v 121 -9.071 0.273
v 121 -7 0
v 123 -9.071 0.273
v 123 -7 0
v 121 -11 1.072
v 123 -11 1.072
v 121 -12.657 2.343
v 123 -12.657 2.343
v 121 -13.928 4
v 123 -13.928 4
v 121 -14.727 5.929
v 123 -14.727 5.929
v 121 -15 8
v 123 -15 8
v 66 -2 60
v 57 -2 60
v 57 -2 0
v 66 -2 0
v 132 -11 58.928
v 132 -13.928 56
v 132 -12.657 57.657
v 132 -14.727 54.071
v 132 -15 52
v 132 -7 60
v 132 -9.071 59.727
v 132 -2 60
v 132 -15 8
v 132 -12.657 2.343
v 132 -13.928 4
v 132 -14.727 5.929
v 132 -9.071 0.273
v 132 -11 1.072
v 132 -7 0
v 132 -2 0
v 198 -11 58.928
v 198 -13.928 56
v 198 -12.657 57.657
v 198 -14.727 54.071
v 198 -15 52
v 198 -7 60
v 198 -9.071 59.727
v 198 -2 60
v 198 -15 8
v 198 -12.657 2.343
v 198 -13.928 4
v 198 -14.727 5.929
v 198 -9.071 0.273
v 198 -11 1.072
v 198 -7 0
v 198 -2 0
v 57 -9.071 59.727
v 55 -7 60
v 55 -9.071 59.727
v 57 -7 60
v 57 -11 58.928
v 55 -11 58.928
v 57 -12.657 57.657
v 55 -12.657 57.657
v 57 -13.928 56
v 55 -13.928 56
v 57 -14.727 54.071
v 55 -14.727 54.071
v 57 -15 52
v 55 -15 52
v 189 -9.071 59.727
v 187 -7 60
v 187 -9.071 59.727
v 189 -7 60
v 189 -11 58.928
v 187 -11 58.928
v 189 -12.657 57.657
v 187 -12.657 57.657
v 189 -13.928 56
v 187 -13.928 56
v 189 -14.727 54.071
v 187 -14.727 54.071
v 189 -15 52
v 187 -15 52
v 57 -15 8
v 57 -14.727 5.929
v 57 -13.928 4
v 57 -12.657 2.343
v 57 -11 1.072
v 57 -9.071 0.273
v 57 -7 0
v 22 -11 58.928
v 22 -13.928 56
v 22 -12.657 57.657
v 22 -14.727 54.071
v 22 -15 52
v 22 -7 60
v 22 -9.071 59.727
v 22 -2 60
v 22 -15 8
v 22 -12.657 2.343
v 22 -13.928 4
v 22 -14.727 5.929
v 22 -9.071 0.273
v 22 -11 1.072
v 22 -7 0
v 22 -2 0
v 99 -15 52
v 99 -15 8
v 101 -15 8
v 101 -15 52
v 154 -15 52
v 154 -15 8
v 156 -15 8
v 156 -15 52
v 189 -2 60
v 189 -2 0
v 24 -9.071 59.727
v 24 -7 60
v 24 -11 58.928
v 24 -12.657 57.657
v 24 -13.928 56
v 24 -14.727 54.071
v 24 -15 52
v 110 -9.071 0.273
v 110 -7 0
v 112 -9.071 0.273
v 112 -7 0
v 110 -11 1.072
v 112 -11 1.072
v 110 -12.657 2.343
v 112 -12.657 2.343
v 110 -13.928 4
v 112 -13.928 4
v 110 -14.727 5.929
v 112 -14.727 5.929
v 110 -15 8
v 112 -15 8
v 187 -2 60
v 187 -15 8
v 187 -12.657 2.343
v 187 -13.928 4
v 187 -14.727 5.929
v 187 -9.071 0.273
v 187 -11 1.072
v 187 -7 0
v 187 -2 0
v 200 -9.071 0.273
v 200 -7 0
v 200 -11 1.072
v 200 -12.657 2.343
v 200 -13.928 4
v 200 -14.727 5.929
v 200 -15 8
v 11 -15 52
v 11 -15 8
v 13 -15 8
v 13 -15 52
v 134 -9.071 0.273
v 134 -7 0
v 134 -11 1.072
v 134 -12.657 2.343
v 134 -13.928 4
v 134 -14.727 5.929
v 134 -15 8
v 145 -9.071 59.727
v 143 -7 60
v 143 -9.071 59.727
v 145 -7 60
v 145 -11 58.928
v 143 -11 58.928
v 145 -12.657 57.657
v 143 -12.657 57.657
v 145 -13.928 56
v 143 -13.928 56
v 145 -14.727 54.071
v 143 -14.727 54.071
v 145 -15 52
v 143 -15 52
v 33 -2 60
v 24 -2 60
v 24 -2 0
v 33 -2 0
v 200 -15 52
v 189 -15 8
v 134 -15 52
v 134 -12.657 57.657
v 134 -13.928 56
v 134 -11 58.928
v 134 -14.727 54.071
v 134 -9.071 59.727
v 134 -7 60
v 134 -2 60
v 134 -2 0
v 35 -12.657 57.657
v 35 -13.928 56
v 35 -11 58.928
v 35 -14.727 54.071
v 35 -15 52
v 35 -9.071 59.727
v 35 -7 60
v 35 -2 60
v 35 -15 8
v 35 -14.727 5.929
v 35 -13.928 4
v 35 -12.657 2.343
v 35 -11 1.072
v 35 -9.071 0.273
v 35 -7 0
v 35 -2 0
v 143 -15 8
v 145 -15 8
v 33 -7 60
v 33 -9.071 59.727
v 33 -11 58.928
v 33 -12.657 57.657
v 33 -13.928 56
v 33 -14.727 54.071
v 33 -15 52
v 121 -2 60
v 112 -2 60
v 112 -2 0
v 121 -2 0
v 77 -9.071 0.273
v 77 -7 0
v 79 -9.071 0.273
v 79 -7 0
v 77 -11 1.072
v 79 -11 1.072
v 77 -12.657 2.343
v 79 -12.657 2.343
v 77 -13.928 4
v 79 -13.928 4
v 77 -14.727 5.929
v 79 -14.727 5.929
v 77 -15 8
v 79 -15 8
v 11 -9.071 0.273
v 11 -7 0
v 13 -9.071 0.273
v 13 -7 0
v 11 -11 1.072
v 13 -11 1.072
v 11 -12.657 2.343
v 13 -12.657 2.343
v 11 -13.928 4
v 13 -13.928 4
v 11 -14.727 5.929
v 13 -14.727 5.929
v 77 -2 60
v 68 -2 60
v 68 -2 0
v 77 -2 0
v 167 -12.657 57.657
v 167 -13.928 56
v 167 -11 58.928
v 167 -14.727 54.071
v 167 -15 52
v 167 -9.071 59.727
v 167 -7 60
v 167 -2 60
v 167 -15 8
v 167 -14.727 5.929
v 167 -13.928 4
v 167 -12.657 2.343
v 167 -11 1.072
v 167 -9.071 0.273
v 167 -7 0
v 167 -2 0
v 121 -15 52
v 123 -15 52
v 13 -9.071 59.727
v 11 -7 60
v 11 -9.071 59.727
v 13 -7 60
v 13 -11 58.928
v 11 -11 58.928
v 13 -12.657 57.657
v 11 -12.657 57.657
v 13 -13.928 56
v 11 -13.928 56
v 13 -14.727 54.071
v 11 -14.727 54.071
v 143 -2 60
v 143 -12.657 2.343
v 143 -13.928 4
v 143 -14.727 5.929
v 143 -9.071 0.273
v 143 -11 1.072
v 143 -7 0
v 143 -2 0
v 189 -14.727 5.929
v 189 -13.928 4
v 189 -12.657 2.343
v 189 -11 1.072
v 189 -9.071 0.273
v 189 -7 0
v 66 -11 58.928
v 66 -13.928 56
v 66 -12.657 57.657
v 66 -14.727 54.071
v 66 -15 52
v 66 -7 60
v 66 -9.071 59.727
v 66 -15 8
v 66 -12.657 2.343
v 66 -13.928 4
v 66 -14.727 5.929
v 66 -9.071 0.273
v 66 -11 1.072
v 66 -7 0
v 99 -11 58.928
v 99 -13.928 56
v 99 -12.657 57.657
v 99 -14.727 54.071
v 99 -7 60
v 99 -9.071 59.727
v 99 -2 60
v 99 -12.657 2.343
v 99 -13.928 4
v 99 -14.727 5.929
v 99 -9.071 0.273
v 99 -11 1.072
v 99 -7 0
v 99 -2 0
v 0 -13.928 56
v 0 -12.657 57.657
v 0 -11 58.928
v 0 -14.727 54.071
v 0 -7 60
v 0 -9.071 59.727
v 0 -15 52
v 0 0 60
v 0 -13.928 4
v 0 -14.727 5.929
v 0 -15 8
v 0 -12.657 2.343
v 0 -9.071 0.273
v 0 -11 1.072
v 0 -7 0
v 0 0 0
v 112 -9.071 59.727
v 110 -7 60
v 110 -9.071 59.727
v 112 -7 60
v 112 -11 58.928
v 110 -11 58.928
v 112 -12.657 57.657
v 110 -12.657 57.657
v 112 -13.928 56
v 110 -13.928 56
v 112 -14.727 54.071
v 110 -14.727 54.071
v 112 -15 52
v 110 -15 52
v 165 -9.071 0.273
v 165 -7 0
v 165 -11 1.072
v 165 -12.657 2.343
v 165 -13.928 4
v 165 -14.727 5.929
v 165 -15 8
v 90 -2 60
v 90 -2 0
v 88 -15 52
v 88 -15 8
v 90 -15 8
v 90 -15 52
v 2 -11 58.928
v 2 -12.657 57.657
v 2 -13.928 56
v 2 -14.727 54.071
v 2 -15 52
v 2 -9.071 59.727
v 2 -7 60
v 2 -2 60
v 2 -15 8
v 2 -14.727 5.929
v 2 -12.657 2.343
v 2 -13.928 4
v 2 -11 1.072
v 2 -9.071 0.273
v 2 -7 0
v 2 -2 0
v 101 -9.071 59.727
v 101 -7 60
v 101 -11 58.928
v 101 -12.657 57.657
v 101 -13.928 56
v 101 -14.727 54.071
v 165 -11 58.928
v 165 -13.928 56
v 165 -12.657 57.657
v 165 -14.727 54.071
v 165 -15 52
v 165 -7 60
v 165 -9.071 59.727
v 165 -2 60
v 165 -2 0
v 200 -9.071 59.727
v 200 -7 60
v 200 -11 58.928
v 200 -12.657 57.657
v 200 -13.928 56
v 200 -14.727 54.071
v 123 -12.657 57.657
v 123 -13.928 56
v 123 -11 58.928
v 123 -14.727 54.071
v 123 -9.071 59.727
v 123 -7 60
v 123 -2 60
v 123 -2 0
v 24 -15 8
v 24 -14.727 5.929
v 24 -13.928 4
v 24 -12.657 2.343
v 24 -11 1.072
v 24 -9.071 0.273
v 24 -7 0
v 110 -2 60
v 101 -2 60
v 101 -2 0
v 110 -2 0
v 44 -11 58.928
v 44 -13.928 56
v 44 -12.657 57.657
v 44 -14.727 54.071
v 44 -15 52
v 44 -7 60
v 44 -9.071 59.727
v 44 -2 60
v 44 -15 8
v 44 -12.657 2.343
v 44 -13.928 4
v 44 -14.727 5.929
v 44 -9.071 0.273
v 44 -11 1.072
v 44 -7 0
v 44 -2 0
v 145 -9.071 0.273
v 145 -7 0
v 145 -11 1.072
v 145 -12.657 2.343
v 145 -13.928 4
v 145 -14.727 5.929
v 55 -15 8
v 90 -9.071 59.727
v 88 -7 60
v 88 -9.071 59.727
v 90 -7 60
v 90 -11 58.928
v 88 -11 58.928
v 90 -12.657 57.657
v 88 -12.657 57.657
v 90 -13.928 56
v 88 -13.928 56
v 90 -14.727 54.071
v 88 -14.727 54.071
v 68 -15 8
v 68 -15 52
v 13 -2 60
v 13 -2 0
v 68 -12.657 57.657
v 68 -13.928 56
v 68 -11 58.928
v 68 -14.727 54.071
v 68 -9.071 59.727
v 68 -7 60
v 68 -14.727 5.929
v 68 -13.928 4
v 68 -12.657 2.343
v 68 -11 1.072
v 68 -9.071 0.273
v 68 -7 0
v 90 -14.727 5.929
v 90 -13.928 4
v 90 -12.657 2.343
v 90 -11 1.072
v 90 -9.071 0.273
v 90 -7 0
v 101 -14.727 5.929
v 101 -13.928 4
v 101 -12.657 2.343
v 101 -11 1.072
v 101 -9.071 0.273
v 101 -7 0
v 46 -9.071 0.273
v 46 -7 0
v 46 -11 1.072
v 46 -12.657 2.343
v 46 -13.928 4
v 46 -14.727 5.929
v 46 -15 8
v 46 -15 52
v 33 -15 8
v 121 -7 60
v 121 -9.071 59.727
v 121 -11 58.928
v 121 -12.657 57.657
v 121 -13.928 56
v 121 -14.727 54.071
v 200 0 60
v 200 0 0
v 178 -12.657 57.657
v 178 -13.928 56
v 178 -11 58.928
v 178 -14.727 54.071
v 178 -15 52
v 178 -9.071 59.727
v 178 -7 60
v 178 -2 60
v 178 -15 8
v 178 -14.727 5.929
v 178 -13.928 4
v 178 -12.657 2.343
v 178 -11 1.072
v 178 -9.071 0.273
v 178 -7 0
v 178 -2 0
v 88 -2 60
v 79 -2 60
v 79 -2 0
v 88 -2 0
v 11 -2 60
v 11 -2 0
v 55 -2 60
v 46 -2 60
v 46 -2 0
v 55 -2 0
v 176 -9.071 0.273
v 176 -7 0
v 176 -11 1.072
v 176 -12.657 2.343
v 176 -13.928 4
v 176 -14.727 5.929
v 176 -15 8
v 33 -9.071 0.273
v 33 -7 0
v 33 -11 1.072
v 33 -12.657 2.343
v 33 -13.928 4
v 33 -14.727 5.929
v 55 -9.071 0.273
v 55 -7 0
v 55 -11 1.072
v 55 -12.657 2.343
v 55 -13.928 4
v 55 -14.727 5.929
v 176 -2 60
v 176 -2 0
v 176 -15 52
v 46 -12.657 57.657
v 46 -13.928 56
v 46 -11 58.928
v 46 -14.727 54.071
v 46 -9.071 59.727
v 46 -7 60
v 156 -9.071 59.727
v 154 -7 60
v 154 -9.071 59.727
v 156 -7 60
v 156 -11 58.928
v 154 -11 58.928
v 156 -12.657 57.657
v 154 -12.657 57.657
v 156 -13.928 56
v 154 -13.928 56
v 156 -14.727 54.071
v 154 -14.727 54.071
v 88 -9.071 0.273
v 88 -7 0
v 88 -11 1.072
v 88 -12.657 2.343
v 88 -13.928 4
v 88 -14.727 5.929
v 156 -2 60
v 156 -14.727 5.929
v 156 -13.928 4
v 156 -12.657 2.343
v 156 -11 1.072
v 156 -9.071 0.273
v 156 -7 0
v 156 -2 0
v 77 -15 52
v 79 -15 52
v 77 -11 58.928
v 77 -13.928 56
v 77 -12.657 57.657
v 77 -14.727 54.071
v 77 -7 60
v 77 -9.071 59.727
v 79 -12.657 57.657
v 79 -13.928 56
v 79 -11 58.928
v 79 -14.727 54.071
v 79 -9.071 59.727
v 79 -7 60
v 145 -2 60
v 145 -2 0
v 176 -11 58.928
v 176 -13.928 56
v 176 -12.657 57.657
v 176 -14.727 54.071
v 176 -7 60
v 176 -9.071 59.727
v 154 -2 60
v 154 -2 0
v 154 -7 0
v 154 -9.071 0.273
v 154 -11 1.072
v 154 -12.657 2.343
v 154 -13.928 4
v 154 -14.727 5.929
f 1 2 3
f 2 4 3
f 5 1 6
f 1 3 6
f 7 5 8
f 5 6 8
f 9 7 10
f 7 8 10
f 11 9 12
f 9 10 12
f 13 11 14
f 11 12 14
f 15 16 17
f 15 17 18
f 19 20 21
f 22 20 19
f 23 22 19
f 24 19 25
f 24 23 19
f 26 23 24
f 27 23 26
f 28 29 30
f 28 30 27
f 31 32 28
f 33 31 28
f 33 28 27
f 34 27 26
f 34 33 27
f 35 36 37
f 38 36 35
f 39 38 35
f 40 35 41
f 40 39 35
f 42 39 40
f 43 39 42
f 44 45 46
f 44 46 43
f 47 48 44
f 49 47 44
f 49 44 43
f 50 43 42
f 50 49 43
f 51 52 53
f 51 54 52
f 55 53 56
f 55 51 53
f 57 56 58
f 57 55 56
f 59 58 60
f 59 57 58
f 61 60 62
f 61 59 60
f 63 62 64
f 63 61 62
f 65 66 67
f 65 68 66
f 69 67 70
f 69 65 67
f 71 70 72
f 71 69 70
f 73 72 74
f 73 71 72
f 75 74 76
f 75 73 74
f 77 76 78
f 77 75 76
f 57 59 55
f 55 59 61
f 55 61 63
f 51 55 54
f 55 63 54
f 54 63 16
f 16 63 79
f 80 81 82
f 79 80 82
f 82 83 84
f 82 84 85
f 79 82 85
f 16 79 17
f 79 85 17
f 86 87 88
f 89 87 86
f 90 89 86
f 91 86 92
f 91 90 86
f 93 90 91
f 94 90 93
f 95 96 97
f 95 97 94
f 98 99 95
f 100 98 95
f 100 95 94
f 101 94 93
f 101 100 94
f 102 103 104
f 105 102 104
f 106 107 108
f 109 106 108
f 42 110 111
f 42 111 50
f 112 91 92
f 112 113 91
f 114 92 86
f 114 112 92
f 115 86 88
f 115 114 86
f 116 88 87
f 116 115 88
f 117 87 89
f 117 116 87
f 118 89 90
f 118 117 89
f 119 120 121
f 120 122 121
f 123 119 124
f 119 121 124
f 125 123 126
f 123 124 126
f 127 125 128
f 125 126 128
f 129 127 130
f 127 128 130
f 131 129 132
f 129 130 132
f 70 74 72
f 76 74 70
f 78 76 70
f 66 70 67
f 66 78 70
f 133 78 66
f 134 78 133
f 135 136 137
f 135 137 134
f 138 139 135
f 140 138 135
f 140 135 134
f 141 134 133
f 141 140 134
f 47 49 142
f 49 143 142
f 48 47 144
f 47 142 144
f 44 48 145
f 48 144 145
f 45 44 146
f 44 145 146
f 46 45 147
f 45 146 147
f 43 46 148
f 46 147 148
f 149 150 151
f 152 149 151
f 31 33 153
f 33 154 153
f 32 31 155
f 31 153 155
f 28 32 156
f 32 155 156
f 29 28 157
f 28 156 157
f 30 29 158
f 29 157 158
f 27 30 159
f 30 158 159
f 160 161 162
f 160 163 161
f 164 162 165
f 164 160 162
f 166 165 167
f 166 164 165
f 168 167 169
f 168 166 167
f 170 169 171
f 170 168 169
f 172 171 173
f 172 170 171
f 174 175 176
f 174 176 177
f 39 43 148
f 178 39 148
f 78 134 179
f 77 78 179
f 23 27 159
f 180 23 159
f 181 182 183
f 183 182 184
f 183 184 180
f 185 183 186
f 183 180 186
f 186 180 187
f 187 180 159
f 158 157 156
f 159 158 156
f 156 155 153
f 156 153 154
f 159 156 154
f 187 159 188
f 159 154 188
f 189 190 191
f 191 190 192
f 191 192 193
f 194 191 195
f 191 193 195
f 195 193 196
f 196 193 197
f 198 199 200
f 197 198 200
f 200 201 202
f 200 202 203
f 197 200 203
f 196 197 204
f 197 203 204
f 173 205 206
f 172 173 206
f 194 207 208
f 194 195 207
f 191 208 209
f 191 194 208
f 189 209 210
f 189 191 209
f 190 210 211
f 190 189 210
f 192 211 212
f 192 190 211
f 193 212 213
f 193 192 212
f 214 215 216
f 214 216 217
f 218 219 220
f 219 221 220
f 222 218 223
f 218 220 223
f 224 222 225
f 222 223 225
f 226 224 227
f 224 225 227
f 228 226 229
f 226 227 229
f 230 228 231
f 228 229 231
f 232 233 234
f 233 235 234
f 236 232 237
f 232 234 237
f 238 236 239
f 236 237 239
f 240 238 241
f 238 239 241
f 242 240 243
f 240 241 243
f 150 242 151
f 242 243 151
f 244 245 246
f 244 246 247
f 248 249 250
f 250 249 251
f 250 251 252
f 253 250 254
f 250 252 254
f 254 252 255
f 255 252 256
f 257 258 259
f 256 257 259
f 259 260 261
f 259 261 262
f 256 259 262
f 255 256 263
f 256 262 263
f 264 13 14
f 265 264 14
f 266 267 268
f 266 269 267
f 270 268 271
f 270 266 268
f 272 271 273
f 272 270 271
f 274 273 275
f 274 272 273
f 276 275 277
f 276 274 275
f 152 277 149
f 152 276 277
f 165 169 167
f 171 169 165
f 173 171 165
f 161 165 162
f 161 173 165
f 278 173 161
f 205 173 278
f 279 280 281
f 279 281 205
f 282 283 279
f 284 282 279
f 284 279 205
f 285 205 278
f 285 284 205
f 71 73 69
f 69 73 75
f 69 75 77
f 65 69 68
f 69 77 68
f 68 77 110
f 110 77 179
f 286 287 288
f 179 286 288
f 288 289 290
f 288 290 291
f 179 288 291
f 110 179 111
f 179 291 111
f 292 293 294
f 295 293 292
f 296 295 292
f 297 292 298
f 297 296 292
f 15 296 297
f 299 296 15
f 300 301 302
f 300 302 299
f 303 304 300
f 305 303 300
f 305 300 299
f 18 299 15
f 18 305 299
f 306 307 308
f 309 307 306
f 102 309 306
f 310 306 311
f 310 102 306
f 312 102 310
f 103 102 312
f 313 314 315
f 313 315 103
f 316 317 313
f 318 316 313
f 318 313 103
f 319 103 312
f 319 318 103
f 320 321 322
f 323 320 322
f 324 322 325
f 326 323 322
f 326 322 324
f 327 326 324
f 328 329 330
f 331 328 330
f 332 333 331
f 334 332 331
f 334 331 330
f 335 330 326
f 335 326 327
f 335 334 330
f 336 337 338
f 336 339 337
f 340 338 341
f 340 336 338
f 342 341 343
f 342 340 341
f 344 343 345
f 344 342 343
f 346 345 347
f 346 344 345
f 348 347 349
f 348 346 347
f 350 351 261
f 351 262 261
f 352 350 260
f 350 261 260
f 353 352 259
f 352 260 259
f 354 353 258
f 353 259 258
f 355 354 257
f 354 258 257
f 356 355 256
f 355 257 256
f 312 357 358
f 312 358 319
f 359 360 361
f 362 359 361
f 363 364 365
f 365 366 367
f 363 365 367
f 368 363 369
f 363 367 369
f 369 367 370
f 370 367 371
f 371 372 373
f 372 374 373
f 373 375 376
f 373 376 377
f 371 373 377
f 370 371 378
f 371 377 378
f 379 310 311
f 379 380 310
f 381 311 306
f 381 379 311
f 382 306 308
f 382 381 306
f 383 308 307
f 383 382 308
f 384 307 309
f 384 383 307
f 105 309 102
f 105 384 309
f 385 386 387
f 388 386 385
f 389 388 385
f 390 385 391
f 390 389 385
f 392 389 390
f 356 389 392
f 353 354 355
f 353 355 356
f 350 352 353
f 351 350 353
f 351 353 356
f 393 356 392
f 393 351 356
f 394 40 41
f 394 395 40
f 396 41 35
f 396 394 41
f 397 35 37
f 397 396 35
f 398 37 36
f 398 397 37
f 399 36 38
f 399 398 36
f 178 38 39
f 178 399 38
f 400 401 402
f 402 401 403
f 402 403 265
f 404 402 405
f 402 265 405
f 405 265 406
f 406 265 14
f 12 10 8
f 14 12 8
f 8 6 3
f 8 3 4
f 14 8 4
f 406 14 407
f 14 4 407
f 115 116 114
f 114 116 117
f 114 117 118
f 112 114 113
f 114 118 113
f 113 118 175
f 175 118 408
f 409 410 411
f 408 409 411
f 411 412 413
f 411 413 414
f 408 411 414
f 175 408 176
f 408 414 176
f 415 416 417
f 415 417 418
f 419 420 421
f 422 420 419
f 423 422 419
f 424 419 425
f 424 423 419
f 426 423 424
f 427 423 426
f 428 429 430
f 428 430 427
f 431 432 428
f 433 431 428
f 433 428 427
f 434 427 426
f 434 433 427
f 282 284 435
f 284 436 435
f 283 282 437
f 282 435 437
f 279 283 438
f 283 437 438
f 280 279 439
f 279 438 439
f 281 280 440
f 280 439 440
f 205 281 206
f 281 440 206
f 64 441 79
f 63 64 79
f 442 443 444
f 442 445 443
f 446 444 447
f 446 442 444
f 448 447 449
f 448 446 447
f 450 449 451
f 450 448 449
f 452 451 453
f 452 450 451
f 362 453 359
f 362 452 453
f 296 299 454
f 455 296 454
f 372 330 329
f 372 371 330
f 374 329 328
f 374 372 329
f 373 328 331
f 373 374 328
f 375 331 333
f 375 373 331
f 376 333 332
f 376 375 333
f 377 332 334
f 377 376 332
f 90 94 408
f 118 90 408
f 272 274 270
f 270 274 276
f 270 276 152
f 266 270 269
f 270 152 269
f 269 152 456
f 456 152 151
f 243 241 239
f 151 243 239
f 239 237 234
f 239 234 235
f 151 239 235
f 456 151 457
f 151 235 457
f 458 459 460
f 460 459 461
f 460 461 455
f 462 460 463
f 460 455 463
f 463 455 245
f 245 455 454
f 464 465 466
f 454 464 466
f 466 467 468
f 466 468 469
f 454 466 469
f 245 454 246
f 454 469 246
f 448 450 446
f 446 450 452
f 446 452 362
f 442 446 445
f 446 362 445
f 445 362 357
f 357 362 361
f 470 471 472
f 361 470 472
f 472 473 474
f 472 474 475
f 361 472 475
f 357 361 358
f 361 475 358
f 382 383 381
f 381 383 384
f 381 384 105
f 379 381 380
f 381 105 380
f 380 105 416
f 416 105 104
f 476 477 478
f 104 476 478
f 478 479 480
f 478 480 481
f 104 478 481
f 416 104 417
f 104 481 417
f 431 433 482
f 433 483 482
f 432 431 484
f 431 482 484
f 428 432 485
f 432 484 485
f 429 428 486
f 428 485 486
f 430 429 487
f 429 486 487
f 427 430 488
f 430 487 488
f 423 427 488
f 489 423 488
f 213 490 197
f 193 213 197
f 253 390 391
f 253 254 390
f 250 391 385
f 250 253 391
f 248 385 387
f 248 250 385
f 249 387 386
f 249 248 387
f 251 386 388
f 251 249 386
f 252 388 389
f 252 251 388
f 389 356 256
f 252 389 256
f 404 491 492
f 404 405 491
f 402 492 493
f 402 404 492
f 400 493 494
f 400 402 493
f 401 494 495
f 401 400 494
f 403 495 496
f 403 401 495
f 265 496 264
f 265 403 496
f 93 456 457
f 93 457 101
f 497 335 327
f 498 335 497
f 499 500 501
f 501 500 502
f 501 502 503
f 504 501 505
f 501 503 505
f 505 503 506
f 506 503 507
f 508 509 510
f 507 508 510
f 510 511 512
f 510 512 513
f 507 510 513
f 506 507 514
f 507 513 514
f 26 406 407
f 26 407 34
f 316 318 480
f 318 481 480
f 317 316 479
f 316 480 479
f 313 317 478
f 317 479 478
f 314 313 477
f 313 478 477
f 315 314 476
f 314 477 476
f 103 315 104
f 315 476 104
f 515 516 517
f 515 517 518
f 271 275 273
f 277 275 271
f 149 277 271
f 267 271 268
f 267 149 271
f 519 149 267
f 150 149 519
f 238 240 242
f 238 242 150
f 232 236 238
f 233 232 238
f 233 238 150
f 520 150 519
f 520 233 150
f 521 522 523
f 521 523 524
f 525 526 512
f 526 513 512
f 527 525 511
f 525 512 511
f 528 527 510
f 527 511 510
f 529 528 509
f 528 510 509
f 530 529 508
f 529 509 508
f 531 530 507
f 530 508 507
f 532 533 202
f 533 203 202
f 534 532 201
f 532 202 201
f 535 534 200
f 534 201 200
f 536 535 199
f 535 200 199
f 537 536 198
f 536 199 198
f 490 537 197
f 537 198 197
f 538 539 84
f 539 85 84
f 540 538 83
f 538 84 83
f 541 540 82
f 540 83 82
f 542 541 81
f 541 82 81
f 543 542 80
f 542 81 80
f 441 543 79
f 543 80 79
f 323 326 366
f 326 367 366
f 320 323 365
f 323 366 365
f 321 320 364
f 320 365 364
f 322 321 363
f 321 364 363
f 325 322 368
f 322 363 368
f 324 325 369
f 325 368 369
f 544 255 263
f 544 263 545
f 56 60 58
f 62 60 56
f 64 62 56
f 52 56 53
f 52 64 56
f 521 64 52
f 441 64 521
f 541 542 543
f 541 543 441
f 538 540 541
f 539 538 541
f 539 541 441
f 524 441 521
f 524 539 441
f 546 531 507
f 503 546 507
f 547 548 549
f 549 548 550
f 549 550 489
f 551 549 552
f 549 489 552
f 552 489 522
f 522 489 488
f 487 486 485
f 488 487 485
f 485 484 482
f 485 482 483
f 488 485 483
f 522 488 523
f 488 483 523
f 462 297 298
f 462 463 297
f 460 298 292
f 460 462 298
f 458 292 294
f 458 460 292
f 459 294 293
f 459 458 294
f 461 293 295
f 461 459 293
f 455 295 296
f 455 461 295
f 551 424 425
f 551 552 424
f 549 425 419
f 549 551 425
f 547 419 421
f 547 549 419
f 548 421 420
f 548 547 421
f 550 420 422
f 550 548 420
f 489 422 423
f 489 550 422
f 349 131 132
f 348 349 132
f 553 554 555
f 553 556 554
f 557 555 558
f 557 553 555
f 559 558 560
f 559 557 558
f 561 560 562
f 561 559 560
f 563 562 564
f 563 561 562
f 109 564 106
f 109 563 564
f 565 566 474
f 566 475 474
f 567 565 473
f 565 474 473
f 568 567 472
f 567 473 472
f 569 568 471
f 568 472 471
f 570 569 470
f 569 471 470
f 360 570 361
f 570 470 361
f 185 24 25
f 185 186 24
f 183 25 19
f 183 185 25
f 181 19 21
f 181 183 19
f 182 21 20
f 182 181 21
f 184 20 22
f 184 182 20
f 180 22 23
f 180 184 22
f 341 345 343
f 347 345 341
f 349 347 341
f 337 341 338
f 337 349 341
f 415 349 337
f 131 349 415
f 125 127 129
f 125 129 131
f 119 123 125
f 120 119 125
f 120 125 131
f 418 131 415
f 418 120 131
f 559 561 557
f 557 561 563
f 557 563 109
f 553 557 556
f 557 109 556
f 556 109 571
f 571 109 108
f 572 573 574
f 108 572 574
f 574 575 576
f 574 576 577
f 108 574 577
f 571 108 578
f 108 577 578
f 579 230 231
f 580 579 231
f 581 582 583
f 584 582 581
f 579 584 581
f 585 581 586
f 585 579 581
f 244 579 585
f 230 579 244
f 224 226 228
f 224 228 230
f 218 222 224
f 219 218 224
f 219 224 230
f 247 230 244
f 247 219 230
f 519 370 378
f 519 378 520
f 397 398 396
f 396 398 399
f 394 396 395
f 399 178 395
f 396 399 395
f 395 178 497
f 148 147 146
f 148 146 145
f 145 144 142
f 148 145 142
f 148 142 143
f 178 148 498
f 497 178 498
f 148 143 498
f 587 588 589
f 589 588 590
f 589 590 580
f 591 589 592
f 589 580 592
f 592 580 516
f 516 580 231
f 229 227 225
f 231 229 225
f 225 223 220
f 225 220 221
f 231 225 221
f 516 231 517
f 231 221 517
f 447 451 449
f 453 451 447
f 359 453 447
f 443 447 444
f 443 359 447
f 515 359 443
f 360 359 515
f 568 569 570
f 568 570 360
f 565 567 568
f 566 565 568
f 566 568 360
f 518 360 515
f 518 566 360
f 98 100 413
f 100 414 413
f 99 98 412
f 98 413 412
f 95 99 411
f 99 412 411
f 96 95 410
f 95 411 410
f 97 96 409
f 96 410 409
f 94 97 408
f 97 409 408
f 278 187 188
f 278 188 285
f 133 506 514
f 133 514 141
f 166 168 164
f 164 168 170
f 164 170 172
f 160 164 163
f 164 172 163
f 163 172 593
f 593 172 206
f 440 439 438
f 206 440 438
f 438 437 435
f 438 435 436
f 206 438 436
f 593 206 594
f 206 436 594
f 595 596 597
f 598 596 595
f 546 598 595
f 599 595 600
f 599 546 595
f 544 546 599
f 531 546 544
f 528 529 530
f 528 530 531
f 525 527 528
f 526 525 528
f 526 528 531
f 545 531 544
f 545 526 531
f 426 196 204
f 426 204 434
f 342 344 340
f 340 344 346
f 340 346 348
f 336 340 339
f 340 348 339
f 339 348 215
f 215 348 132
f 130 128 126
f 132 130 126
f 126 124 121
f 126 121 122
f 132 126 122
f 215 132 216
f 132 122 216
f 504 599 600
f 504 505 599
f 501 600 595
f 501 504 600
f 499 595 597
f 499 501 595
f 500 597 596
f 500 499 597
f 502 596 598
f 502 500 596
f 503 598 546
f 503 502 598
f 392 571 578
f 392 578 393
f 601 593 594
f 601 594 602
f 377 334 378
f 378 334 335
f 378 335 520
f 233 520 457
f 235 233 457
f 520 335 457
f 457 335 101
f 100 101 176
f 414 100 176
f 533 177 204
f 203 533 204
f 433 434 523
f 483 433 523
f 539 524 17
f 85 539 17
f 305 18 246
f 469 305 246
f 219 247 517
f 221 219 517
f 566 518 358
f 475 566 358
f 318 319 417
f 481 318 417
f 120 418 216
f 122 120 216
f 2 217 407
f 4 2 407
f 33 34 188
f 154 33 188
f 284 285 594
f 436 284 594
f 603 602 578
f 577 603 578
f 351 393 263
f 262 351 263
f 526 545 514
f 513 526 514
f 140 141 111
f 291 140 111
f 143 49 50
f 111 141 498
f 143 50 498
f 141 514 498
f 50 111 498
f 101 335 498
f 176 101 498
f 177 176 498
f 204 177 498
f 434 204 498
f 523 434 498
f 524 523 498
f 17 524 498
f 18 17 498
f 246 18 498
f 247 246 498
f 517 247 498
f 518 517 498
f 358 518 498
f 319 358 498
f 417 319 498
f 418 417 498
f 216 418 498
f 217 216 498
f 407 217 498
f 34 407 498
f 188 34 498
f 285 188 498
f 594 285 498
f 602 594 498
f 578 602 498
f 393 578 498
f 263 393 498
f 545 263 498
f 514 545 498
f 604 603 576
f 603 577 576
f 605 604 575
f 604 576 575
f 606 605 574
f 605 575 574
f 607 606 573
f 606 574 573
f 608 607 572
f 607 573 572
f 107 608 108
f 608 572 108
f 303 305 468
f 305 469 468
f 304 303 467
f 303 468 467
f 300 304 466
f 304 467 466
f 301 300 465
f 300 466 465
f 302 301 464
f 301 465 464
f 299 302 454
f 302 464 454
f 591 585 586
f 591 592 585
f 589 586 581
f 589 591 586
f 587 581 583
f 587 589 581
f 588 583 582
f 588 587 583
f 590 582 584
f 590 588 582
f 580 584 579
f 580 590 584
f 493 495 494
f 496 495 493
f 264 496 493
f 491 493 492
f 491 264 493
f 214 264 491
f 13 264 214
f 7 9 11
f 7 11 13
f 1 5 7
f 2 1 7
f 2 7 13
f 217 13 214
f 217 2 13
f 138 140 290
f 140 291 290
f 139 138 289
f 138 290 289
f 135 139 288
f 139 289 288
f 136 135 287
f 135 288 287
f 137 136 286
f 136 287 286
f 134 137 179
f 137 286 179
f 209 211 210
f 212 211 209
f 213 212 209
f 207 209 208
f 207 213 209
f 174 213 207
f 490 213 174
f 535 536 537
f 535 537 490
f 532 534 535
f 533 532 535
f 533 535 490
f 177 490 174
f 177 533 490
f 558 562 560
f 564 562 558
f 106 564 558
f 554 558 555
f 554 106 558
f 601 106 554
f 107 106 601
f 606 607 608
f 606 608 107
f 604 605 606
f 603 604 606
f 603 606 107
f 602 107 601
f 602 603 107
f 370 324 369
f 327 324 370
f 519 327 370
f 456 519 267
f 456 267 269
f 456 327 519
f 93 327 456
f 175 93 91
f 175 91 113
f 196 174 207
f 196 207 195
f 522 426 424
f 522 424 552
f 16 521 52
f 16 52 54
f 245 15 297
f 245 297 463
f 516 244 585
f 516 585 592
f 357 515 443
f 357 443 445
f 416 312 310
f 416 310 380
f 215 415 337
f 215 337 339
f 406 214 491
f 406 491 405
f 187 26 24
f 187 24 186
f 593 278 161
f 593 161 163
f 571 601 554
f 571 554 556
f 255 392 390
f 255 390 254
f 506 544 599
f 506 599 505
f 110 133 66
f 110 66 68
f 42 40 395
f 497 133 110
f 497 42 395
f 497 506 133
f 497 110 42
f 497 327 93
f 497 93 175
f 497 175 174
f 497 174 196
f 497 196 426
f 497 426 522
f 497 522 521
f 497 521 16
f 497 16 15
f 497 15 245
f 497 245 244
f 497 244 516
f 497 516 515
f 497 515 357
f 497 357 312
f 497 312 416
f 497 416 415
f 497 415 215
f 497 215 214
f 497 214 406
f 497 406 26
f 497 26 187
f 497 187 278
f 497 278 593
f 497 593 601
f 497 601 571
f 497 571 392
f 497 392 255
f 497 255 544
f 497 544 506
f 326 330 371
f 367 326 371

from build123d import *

# Parameters (mm, degrees)
BOX016_W     = 9
BOX016_H     = 13
BOX016_DEPTH = 60
BOX004_W     = 9
BOX004_H     = 13
BOX004_DEPTH = 60
BOX005_W     = 9
BOX005_H     = 13
BOX005_DEPTH = 60
BOX006_W     = 9
BOX006_H     = 13
BOX006_DEPTH = 60
BOX007_W     = 9
BOX007_H     = 13
BOX007_DEPTH = 60
BOX008_W     = 9
BOX008_H     = 13
BOX008_DEPTH = 60
BOX009_W     = 9
BOX009_H     = 13
BOX009_DEPTH = 60
BOX010_W     = 9
BOX010_H     = 13
BOX010_DEPTH = 60
BOX011_W     = 9
BOX011_H     = 13
BOX011_DEPTH = 60
BOX012_W     = 9
BOX012_H     = 13
BOX012_DEPTH = 60
BOX013_W     = 9
BOX013_H     = 13
BOX013_DEPTH = 60
BOX014_W     = 9
BOX014_H     = 13
BOX014_DEPTH = 60
BOX015_W     = 9
BOX015_H     = 13
BOX015_DEPTH = 60
BOX017_W     = 9
BOX017_H     = 13
BOX017_DEPTH = 60
BOX018_W     = 9
BOX018_H     = 13
BOX018_DEPTH = 60
BOX019_W     = 9
BOX019_H     = 13
BOX019_DEPTH = 60
BOX020_W     = 9
BOX020_H     = 13
BOX020_DEPTH = 60
BOX003_W     = 9
BOX003_H     = 13
BOX003_DEPTH = 60
BOX002_W     = 200
BOX002_H     = 15
BOX002_DEPTH = 60
FILLET_R     = 8


with BuildPart() as cube016:
    # Box016 → Box016 (new body)
    with BuildSketch(Plane(origin=(145, -15, 0), x_dir=(1, 0, 0), z_dir=(0, 0, 1))):
        with Locations((4.5, 6.5)):
            Rectangle(BOX016_W, BOX016_H)
    extrude(amount=BOX016_DEPTH)


with BuildPart() as cube004:
    # Box004 → Box004 (new body)
    with BuildSketch(Plane(origin=(13, -15, 0), x_dir=(1, 0, 0), z_dir=(0, 0, 1))):
        with Locations((4.5, 6.5)):
            Rectangle(BOX004_W, BOX004_H)
    extrude(amount=BOX004_DEPTH)


with BuildPart() as cube005:
    # Box005 → Box005 (new body)
    with BuildSketch(Plane(origin=(24, -15, 0), x_dir=(1, 0, 0), z_dir=(0, 0, 1))):
        with Locations((4.5, 6.5)):
            Rectangle(BOX005_W, BOX005_H)
    extrude(amount=BOX005_DEPTH)


with BuildPart() as cube006:
    # Box006 → Box006 (new body)
    with BuildSketch(Plane(origin=(35, -15, 0), x_dir=(1, 0, 0), z_dir=(0, 0, 1))):
        with Locations((4.5, 6.5)):
            Rectangle(BOX006_W, BOX006_H)
    extrude(amount=BOX006_DEPTH)


with BuildPart() as cube007:
    # Box007 → Box007 (new body)
    with BuildSketch(Plane(origin=(46, -15, 0), x_dir=(1, 0, 0), z_dir=(0, 0, 1))):
        with Locations((4.5, 6.5)):
            Rectangle(BOX007_W, BOX007_H)
    extrude(amount=BOX007_DEPTH)


with BuildPart() as cube008:
    # Box008 → Box008 (new body)
    with BuildSketch(Plane(origin=(57, -15, 0), x_dir=(1, 0, 0), z_dir=(0, 0, 1))):
        with Locations((4.5, 6.5)):
            Rectangle(BOX008_W, BOX008_H)
    extrude(amount=BOX008_DEPTH)


with BuildPart() as cube009:
    # Box009 → Box009 (new body)
    with BuildSketch(Plane(origin=(68, -15, 0), x_dir=(1, 0, 0), z_dir=(0, 0, 1))):
        with Locations((4.5, 6.5)):
            Rectangle(BOX009_W, BOX009_H)
    extrude(amount=BOX009_DEPTH)


with BuildPart() as cube010:
    # Box010 → Box010 (new body)
    with BuildSketch(Plane(origin=(79, -15, 0), x_dir=(1, 0, 0), z_dir=(0, 0, 1))):
        with Locations((4.5, 6.5)):
            Rectangle(BOX010_W, BOX010_H)
    extrude(amount=BOX010_DEPTH)


with BuildPart() as cube011:
    # Box011 → Box011 (new body)
    with BuildSketch(Plane(origin=(90, -15, 0), x_dir=(1, 0, 0), z_dir=(0, 0, 1))):
        with Locations((4.5, 6.5)):
            Rectangle(BOX011_W, BOX011_H)
    extrude(amount=BOX011_DEPTH)


with BuildPart() as cube012:
    # Box012 → Box012 (new body)
    with BuildSketch(Plane(origin=(101, -15, 0), x_dir=(1, 0, 0), z_dir=(0, 0, 1))):
        with Locations((4.5, 6.5)):
            Rectangle(BOX012_W, BOX012_H)
    extrude(amount=BOX012_DEPTH)


with BuildPart() as cube013:
    # Box013 → Box013 (new body)
    with BuildSketch(Plane(origin=(112, -15, 0), x_dir=(1, 0, 0), z_dir=(0, 0, 1))):
        with Locations((4.5, 6.5)):
            Rectangle(BOX013_W, BOX013_H)
    extrude(amount=BOX013_DEPTH)


with BuildPart() as cube014:
    # Box014 → Box014 (new body)
    with BuildSketch(Plane(origin=(123, -15, 0), x_dir=(1, 0, 0), z_dir=(0, 0, 1))):
        with Locations((4.5, 6.5)):
            Rectangle(BOX014_W, BOX014_H)
    extrude(amount=BOX014_DEPTH)


with BuildPart() as cube015:
    # Box015 → Box015 (new body)
    with BuildSketch(Plane(origin=(134, -15, 0), x_dir=(1, 0, 0), z_dir=(0, 0, 1))):
        with Locations((4.5, 6.5)):
            Rectangle(BOX015_W, BOX015_H)
    extrude(amount=BOX015_DEPTH)


with BuildPart() as cube017:
    # Box017 → Box017 (new body)
    with BuildSketch(Plane(origin=(156, -15, 0), x_dir=(1, 0, 0), z_dir=(0, 0, 1))):
        with Locations((4.5, 6.5)):
            Rectangle(BOX017_W, BOX017_H)
    extrude(amount=BOX017_DEPTH)


with BuildPart() as cube018:
    # Box018 → Box018 (new body)
    with BuildSketch(Plane(origin=(167, -15, 0), x_dir=(1, 0, 0), z_dir=(0, 0, 1))):
        with Locations((4.5, 6.5)):
            Rectangle(BOX018_W, BOX018_H)
    extrude(amount=BOX018_DEPTH)


with BuildPart() as cube019:
    # Box019 → Box019 (new body)
    with BuildSketch(Plane(origin=(178, -15, 0), x_dir=(1, 0, 0), z_dir=(0, 0, 1))):
        with Locations((4.5, 6.5)):
            Rectangle(BOX019_W, BOX019_H)
    extrude(amount=BOX019_DEPTH)


with BuildPart() as cube020:
    # Box020 → Box020 (new body)
    with BuildSketch(Plane(origin=(189, -15, 0), x_dir=(1, 0, 0), z_dir=(0, 0, 1))):
        with Locations((4.5, 6.5)):
            Rectangle(BOX020_W, BOX020_H)
    extrude(amount=BOX020_DEPTH)


with BuildPart() as compound:
    # Box003 → Box003 (new body)
    with BuildSketch(Plane(origin=(2, -15, 0), x_dir=(1, 0, 0), z_dir=(0, 0, 1))):
        with Locations((4.5, 6.5)):
            Rectangle(BOX003_W, BOX003_H)
    extrude(amount=BOX003_DEPTH)

    # Compound: union Cube016, Cube004, Cube005, Cube006, Cube007, Cube008, Cube009, Cube010, Cube011, Cube012, Cube013, Cube014, Cube015, Cube017, Cube018, Cube019, Cube020
    add(cube016.part)
    add(cube004.part)
    add(cube005.part)
    add(cube006.part)
    add(cube007.part)
    add(cube008.part)
    add(cube009.part)
    add(cube010.part)
    add(cube011.part)
    add(cube012.part)
    add(cube013.part)
    add(cube014.part)
    add(cube015.part)
    add(cube017.part)
    add(cube018.part)
    add(cube019.part)
    add(cube020.part)


with BuildPart() as left_heatsink:
    # Box002 → Box002 (new body)
    with BuildSketch(Plane(origin=(0, -15, 0), x_dir=(1, 0, 0), z_dir=(0, 0, 1))):
        with Locations((100, 7.5)):
            Rectangle(BOX002_W, BOX002_H)
    extrude(amount=BOX002_DEPTH)

    # Cut001: cut Compound
    add(compound.part, mode=Mode.SUBTRACT)

    # Fillet
    fillet_edges = [left_heatsink.edges().sort_by_distance(p)[0] for p in [
        (1, -15, 0),
        (1, -15, 60),
        (199, -15, 60),
        (188, -15, 60),
        (177, -15, 60),
        (166, -15, 60),
        (155, -15, 60),
        (144, -15, 60),
        (133, -15, 60),
        (122, -15, 60),
        (111, -15, 60),
        (100, -15, 60),
        (89, -15, 60),
        (78, -15, 60),
        (67, -15, 60),
        (56, -15, 60),
        (45, -15, 60),
        (34, -15, 60),
        (23, -15, 60),
        (12, -15, 60),
        (199, -15, 0),
        (188, -15, 0),
        (177, -15, 0),
        (166, -15, 0),
        (155, -15, 0),
        (144, -15, 0),
        (133, -15, 0),
        (122, -15, 0),
        (111, -15, 0),
        (100, -15, 0),
        (89, -15, 0),
        (78, -15, 0),
        (67, -15, 0),
        (56, -15, 0),
        (45, -15, 0),
        (34, -15, 0),
        (23, -15, 0),
        (12, -15, 0),
    ]]
    fillet(fillet_edges, radius=FILLET_R)


solid = left_heatsink.part
